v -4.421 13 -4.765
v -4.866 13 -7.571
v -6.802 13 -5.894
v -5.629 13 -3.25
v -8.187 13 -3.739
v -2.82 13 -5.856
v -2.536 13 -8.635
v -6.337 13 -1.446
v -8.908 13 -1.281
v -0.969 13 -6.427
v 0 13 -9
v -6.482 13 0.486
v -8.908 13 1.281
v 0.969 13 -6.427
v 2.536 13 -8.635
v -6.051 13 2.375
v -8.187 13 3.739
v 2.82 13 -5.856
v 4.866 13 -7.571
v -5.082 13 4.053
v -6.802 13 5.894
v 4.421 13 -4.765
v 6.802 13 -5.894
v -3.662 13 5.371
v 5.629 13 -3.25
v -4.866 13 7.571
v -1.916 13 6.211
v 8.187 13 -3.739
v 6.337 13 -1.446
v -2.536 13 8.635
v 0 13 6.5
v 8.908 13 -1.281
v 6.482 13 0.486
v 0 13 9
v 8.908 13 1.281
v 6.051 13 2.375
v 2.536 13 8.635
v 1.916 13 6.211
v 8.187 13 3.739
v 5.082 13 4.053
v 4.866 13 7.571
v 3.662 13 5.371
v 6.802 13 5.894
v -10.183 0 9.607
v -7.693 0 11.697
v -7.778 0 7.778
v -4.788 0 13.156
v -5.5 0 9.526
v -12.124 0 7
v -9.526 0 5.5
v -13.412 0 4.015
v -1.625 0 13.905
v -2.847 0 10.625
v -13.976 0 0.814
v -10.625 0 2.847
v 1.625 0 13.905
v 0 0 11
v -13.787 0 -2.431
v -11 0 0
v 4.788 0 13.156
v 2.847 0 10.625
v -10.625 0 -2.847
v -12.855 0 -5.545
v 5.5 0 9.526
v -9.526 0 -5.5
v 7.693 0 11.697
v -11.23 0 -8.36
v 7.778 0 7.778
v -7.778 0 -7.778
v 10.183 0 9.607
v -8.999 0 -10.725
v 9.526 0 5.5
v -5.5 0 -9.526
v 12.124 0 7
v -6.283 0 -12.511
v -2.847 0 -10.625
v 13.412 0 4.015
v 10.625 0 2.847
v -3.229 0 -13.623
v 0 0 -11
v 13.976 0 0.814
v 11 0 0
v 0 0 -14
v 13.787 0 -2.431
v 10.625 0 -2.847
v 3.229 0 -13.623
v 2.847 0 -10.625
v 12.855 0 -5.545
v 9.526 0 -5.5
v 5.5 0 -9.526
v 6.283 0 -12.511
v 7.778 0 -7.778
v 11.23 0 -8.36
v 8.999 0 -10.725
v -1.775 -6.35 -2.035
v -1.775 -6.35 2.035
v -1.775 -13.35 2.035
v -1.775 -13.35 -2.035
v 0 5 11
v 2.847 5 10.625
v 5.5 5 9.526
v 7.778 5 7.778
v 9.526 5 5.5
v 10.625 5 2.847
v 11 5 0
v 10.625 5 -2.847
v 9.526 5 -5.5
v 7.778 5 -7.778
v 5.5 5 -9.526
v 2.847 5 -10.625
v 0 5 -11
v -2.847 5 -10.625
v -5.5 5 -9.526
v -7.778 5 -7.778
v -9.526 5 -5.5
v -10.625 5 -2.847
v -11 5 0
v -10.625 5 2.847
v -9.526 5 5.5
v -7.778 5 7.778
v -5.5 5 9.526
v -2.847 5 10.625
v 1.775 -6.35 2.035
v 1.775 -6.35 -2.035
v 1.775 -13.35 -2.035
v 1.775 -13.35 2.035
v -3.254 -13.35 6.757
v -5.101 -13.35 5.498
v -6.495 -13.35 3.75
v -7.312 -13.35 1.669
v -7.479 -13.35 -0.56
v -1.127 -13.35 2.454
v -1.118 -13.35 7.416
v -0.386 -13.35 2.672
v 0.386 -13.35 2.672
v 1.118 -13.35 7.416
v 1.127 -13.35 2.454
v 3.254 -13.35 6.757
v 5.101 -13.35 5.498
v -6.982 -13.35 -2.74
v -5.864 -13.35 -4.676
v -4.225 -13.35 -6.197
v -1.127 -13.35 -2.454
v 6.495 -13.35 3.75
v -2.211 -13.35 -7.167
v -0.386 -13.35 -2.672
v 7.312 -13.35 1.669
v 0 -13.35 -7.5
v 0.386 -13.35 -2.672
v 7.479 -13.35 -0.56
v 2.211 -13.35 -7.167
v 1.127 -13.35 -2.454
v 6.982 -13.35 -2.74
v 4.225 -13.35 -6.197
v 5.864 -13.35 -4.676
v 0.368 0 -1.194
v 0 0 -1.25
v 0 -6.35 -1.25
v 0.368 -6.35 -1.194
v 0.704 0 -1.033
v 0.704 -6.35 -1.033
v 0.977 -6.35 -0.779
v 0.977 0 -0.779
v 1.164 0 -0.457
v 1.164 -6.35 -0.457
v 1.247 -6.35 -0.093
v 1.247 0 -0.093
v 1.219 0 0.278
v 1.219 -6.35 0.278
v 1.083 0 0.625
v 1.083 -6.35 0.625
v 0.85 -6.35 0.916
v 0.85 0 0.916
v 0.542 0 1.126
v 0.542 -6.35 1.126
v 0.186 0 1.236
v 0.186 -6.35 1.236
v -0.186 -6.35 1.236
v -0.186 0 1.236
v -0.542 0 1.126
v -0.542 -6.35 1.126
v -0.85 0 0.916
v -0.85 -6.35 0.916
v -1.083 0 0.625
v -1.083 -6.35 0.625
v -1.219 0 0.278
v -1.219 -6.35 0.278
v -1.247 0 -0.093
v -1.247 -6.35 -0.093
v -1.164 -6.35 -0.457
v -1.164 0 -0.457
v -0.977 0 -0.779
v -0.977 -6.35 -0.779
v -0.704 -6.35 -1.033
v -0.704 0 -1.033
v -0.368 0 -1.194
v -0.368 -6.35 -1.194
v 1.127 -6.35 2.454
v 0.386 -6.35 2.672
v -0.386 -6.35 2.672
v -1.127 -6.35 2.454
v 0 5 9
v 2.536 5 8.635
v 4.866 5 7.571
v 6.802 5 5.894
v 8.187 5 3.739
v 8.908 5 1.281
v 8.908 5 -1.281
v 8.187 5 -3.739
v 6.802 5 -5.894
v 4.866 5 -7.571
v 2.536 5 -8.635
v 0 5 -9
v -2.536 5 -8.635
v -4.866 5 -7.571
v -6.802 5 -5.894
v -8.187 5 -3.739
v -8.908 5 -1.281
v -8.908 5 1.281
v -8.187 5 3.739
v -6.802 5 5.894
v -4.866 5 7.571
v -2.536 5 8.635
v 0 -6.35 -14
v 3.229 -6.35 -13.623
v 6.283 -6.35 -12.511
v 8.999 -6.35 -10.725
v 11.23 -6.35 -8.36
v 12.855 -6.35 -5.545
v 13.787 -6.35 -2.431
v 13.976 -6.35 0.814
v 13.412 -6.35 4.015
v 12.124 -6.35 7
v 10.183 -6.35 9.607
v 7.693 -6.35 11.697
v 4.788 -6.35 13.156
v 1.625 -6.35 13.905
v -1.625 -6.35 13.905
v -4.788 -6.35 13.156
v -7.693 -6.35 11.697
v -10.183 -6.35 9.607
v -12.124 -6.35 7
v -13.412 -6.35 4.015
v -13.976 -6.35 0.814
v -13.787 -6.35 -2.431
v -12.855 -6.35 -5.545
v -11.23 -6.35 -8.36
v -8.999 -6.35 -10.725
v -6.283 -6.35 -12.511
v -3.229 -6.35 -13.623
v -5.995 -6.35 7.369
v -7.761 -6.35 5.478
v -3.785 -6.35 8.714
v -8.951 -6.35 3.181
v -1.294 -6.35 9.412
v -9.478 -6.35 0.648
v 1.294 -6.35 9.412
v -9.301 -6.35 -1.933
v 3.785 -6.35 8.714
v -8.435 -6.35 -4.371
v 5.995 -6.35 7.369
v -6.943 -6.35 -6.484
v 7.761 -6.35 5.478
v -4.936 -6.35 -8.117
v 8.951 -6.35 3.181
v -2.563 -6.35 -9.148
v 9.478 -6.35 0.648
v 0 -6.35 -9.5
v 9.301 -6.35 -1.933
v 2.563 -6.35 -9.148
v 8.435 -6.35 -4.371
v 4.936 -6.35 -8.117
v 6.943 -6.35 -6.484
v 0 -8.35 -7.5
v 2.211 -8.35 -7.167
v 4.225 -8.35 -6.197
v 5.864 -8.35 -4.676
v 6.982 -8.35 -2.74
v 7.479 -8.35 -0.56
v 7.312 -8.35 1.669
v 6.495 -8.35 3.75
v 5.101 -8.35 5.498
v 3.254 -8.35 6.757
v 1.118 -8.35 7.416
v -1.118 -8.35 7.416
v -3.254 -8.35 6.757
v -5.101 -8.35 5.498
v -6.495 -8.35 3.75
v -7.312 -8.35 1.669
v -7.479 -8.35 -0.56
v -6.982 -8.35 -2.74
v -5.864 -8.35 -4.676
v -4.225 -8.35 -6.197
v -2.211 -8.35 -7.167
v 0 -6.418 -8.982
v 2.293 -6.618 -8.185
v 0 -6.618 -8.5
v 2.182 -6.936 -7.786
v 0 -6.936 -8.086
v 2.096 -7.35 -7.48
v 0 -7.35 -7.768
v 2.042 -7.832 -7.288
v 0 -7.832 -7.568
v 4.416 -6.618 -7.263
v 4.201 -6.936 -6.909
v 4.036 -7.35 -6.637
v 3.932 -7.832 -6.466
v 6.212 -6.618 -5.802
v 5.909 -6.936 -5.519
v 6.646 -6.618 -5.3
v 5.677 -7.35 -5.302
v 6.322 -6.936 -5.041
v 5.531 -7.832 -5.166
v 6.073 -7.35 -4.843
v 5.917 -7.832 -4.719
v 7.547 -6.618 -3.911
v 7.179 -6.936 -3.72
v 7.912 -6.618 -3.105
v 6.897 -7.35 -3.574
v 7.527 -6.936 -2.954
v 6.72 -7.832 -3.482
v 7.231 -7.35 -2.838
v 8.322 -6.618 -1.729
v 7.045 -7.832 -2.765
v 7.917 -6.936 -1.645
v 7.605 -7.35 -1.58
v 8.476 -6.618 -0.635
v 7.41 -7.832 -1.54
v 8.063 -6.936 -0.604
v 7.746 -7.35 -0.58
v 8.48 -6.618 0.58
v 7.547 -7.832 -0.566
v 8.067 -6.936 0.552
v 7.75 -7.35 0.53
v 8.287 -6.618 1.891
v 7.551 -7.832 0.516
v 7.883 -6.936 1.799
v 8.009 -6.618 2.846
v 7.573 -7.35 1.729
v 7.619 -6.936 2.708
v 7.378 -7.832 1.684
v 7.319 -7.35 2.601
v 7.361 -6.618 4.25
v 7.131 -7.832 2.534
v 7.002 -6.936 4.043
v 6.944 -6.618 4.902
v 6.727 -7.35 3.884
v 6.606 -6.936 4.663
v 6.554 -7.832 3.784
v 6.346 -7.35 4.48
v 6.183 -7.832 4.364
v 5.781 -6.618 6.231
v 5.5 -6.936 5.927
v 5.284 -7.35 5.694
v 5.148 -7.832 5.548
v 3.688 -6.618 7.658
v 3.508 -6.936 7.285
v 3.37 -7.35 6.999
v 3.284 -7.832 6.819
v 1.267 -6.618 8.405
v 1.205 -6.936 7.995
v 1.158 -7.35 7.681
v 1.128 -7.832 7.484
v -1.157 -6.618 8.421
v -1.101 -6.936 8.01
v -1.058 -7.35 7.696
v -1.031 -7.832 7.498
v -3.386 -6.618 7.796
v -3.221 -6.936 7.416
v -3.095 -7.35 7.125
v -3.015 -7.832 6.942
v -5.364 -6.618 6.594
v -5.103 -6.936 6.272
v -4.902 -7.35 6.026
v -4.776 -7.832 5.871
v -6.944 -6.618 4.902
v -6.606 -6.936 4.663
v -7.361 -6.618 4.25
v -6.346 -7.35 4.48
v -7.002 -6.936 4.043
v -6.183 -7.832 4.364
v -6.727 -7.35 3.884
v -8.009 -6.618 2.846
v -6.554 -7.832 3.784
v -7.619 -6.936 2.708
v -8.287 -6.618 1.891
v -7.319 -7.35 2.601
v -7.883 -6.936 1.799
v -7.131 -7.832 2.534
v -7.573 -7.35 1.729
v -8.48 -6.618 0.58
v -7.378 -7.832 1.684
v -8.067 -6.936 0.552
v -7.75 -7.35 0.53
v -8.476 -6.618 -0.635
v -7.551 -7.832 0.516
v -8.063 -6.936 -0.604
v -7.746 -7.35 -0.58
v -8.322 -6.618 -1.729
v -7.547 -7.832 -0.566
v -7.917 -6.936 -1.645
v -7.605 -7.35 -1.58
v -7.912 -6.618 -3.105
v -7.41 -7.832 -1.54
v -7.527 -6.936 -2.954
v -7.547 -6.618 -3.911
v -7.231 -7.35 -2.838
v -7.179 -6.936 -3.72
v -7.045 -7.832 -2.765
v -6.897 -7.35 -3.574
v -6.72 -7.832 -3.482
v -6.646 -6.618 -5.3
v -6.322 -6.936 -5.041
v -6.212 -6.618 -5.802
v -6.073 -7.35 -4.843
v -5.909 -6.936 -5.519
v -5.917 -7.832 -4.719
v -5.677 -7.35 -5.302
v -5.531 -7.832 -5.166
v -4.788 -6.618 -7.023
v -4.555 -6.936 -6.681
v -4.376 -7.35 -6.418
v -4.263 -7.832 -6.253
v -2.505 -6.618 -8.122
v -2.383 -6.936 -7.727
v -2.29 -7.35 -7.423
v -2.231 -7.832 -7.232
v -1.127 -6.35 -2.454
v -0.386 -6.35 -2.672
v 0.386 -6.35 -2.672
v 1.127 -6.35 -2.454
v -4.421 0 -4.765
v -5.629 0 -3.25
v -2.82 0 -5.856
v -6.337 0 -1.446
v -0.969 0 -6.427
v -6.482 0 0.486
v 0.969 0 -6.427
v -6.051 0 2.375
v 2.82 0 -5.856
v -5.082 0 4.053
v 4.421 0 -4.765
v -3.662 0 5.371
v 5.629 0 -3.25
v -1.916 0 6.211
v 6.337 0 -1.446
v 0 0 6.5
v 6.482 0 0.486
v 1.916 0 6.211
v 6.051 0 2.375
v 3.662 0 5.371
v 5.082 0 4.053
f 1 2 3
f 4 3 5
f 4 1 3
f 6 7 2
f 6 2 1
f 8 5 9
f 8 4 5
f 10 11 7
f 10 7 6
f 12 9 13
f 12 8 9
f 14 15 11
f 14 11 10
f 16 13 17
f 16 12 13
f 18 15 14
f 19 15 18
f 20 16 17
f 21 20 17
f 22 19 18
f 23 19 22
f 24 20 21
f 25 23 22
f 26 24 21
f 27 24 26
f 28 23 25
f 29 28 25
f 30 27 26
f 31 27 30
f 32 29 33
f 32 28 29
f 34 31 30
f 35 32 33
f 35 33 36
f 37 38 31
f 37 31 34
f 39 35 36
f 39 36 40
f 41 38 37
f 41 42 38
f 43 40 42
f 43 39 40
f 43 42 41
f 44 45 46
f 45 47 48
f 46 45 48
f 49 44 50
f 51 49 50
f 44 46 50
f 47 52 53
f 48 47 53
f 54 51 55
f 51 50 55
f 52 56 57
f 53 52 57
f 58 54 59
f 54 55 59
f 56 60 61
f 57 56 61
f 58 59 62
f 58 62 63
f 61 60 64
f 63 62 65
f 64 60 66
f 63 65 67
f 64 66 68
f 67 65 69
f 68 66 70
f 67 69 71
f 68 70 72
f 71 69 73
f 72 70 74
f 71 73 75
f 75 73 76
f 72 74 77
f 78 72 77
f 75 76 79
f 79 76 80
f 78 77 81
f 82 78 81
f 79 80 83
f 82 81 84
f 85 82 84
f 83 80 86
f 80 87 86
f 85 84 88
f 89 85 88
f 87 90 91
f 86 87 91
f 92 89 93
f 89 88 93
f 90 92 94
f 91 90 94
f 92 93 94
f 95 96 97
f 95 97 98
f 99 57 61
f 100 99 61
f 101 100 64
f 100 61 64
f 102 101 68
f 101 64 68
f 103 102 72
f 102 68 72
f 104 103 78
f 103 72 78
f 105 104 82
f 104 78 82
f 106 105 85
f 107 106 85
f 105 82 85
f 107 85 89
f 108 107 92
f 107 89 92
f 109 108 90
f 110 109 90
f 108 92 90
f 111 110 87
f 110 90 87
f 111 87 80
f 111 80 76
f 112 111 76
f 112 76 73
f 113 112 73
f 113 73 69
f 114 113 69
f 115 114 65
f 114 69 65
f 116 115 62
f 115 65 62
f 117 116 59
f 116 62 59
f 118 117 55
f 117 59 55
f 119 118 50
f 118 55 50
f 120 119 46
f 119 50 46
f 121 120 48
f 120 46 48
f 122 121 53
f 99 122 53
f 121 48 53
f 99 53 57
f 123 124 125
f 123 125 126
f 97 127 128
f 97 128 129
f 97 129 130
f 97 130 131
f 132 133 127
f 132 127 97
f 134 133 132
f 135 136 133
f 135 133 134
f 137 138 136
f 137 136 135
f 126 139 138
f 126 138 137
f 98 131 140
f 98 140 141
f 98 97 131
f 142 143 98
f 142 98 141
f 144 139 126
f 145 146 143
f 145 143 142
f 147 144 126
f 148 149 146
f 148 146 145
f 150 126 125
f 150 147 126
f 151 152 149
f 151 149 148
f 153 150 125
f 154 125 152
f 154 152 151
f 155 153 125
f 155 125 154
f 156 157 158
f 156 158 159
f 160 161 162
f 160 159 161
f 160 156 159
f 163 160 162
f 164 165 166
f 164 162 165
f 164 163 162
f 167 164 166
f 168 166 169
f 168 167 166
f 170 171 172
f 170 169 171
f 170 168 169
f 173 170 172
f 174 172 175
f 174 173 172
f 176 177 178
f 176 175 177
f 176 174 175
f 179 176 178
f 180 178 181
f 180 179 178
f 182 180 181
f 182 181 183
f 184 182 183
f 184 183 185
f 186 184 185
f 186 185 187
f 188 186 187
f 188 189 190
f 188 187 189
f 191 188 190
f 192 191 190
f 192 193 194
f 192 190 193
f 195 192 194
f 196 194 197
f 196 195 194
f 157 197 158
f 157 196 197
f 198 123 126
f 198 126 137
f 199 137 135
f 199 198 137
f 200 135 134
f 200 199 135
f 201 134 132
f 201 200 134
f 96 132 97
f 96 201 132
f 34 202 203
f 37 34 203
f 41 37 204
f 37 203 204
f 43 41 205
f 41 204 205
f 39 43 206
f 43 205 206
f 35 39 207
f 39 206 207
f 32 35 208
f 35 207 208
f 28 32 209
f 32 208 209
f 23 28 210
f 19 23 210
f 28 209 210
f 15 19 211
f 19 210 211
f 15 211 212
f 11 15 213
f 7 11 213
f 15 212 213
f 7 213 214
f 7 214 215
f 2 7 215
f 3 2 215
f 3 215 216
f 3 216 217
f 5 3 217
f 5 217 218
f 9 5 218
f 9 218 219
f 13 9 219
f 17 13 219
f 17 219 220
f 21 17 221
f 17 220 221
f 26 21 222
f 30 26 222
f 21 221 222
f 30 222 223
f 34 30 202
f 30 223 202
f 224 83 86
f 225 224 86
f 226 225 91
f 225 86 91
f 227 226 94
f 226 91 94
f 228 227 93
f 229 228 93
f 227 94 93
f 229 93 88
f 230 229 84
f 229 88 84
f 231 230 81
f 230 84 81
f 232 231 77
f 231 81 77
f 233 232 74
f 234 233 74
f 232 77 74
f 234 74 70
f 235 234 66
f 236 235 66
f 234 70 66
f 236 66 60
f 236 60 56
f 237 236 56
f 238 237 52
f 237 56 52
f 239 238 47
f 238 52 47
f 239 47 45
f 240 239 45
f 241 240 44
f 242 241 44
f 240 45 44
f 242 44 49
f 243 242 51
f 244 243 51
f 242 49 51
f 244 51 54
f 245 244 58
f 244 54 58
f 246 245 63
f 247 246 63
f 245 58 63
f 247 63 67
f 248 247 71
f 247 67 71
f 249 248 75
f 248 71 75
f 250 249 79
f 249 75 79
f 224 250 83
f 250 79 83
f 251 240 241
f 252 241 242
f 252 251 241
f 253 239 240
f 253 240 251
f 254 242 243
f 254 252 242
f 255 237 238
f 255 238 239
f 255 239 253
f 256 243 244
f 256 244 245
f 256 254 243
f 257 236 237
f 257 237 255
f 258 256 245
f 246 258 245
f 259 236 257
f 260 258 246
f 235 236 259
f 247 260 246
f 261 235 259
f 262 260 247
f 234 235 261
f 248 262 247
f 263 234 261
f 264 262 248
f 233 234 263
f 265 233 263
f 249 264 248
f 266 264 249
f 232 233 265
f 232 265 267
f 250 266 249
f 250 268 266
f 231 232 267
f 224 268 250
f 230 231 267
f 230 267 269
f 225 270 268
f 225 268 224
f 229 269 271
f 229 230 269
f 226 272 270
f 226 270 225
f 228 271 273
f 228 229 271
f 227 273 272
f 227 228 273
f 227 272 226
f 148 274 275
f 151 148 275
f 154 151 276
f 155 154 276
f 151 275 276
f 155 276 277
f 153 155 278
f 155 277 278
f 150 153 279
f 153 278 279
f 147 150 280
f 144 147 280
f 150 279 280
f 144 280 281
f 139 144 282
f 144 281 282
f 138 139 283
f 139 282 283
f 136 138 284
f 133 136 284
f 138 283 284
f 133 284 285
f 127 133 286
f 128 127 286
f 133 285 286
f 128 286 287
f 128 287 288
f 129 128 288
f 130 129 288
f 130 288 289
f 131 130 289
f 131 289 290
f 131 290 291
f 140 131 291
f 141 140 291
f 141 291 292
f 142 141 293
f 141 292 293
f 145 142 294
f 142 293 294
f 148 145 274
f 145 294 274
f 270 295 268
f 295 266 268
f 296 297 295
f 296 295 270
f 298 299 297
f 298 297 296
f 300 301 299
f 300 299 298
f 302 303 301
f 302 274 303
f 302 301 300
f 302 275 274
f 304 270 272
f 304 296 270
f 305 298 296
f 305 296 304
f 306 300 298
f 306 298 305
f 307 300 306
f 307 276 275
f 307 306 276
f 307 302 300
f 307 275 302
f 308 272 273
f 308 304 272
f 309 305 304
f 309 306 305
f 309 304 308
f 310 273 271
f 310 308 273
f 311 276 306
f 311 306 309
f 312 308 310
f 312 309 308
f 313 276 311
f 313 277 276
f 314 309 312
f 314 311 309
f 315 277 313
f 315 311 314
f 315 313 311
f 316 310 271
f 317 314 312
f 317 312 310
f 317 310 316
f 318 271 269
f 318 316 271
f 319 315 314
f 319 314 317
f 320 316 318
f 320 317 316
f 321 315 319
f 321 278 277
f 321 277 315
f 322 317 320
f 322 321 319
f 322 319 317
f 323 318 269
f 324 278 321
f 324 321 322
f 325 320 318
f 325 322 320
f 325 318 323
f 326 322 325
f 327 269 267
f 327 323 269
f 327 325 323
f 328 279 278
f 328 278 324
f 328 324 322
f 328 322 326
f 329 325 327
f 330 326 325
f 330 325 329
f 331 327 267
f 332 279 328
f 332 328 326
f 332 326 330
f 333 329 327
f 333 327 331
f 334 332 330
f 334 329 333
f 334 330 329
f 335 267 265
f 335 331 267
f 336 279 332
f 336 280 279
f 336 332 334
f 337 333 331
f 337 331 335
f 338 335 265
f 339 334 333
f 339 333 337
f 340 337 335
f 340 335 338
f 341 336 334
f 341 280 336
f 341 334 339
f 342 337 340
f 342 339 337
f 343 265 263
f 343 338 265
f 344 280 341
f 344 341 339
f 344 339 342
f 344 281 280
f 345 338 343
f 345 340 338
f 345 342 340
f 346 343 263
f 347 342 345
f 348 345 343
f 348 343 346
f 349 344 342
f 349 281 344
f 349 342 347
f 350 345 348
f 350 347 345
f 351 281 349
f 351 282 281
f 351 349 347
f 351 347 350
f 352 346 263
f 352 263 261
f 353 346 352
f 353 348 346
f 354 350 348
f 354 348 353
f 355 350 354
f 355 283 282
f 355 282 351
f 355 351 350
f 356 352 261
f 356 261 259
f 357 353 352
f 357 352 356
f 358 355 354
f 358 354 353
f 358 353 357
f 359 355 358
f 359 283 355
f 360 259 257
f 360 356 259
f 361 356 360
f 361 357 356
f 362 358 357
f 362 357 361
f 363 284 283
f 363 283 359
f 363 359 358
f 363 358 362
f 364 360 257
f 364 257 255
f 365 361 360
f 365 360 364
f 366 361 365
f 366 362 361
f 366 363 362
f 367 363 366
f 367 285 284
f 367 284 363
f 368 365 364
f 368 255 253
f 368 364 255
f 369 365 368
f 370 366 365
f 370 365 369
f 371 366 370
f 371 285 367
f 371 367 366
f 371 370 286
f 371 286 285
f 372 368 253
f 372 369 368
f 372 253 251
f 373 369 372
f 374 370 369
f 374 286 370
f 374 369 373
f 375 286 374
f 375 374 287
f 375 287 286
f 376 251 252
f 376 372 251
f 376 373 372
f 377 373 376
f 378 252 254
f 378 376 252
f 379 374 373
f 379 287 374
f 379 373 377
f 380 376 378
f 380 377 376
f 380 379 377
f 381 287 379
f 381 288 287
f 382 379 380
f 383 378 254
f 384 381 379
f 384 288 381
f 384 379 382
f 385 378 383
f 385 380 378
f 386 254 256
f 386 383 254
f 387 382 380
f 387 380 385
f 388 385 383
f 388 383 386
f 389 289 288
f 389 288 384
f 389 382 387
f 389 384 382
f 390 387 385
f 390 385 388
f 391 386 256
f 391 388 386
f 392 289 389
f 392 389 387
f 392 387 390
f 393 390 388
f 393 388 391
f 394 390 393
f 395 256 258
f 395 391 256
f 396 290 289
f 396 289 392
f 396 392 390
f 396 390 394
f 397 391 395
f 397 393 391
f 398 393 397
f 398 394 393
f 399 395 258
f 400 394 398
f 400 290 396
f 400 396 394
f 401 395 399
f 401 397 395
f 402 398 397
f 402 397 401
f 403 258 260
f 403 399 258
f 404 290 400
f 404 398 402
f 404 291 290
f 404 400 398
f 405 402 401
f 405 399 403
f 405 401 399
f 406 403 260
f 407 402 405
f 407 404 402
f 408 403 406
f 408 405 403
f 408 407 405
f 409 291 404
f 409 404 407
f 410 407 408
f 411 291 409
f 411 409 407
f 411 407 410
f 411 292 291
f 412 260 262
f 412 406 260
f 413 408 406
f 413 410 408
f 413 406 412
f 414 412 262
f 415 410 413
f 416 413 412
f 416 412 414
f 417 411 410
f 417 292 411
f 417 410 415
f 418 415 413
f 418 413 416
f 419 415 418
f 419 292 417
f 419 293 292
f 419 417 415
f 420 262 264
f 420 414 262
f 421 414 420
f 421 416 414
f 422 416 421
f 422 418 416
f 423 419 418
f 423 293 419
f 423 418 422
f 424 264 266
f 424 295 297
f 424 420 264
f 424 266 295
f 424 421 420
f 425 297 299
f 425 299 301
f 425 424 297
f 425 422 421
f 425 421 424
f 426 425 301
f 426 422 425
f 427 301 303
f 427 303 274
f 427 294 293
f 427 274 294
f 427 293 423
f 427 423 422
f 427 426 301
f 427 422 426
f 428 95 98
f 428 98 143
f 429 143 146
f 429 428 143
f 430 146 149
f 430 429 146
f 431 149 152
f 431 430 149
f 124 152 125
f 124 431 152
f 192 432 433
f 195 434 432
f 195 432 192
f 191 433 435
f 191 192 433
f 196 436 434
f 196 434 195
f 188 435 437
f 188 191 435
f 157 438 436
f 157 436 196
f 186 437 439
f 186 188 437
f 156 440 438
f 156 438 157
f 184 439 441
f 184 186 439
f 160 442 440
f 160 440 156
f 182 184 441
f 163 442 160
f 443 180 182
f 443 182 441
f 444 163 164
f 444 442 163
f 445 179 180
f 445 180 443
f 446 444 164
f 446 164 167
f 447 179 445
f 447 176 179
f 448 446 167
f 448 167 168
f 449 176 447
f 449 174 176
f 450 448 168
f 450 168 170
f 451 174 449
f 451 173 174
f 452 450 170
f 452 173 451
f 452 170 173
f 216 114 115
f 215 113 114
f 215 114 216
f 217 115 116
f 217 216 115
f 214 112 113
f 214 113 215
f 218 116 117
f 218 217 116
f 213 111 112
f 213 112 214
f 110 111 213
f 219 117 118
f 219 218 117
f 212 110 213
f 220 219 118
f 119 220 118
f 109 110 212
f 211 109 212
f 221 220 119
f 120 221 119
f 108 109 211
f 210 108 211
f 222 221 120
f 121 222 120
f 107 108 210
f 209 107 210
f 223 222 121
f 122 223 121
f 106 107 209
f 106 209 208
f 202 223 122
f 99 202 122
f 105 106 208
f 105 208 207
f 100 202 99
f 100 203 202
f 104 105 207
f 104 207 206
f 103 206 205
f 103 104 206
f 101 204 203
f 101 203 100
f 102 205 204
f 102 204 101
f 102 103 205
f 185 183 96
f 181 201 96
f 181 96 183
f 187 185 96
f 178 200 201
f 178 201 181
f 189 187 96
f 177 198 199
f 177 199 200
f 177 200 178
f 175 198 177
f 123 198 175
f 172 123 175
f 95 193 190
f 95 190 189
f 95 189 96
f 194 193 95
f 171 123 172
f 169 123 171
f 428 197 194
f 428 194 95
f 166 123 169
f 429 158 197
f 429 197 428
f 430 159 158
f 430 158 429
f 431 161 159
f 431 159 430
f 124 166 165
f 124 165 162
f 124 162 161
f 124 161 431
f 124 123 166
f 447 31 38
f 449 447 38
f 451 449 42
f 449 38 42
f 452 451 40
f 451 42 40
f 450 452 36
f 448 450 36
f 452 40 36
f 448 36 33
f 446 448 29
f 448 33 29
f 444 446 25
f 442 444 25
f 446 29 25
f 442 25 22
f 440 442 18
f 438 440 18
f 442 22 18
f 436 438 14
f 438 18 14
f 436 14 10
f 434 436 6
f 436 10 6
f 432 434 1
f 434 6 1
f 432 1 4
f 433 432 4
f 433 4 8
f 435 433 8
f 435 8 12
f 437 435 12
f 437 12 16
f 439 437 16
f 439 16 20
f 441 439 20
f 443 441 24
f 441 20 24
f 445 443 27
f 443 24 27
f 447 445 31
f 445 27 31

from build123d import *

# Parameters (mm, degrees)
ESQUISSE1_R                  = 11
BOSS_EXTRU_1_DEPTH           = 5
ESQUISSE2_R                  = 9
BOSS_EXTRU_2_DEPTH           = 8
ESQUISSE3_R                  = 14
BOSS_EXTRU_3_DEPTH           = 6.35
ESQUISSE4_R                  = 7.5
BOSS_EXTRU_5_DEPTH           = 7
ENL_V_MAT_EXTRU_1_DEPTH      = 28.684336727
ENL_V_MAT_EXTRU_1_DEPTH_BACK = 28.684336727
ESQUISSE5_R                  = 1.25
ESQUISSE6_R                  = 6.5
ENL_V_MAT_EXTRU_2_DEPTH      = 13
CONG_3_R                     = 2


with BuildPart() as part:
    # Esquisse1 → Boss.-Extru.1 (new body)
    with BuildSketch(Plane(origin=(0, 0, 0), x_dir=(1, 0, 0), z_dir=(0, 1, 0))):
        with Locations(Location((0, 0, 0), (0, 0, 270))):
            Circle(ESQUISSE1_R)
    extrude(amount=BOSS_EXTRU_1_DEPTH)

    # Esquisse2 → Boss.-Extru.2 (add)
    with BuildSketch(Plane(origin=(0, 5, 0), x_dir=(1, 0, 0), z_dir=(0, 1, 0))):
        with Locations(Location((0, 0, 0), (0, 0, 270))):
            Circle(ESQUISSE2_R)
    extrude(amount=BOSS_EXTRU_2_DEPTH)

    # Esquisse3 → Boss.-Extru.3 (add)
    with BuildSketch(Plane.XZ):
        with Locations(Location((0, 0, 0), (0, 0, 270))):
            Circle(ESQUISSE3_R)
    extrude(amount=BOSS_EXTRU_3_DEPTH)

    # Esquisse4 → Boss.-Extru.5 (add)
    with BuildSketch(Plane.XZ.offset(6.35)):
        with Locations(Location((0, 0, 0), (0, 0, 270))):
            Circle(ESQUISSE4_R)
        with BuildLine():
            Line((1.775, -2.034545404), (1.775, 2.034545404))
            ThreePointArc((1.775, 2.034545404), (0, 2.7), (-1.775, 2.034545404))
            Line((-1.775, 2.034545404), (-1.775, -2.034545404))
            ThreePointArc((-1.775, -2.034545404), (0, -2.7), (1.775, -2.034545404))
        make_face(mode=Mode.SUBTRACT)
    extrude(amount=BOSS_EXTRU_5_DEPTH)

    # Esquisse5 → Enlèv. mat.-Extru.1 (cut, two sides: drawn at the far end of the back side and taken through both)
    with BuildSketch(Plane.XZ.offset(6.35).offset(-ENL_V_MAT_EXTRU_1_DEPTH_BACK)):
        with Locations(Location((0, 0, 0), (0, 0, 270))):
            Circle(ESQUISSE5_R)
    extrude(amount=ENL_V_MAT_EXTRU_1_DEPTH + ENL_V_MAT_EXTRU_1_DEPTH_BACK, mode=Mode.SUBTRACT)

    # Esquisse6 → Enlèv. mat.-Extru.2 (cut)
    with BuildSketch(Plane(origin=(0, 13, 0), x_dir=(1, 0, 0), z_dir=(0, 1, 0))):
        with Locations(Location((0, 0, 0), (0, 0, 270))):
            Circle(ESQUISSE6_R)
    extrude(amount=-ENL_V_MAT_EXTRU_2_DEPTH, mode=Mode.SUBTRACT)

    # Congé3
    cong_3_edges = [part.edges().sort_by_distance(p)[0] for p in [
        (0, -6.35, 7.5),
    ]]
    fillet(cong_3_edges, radius=CONG_3_R)


solid = part.part
